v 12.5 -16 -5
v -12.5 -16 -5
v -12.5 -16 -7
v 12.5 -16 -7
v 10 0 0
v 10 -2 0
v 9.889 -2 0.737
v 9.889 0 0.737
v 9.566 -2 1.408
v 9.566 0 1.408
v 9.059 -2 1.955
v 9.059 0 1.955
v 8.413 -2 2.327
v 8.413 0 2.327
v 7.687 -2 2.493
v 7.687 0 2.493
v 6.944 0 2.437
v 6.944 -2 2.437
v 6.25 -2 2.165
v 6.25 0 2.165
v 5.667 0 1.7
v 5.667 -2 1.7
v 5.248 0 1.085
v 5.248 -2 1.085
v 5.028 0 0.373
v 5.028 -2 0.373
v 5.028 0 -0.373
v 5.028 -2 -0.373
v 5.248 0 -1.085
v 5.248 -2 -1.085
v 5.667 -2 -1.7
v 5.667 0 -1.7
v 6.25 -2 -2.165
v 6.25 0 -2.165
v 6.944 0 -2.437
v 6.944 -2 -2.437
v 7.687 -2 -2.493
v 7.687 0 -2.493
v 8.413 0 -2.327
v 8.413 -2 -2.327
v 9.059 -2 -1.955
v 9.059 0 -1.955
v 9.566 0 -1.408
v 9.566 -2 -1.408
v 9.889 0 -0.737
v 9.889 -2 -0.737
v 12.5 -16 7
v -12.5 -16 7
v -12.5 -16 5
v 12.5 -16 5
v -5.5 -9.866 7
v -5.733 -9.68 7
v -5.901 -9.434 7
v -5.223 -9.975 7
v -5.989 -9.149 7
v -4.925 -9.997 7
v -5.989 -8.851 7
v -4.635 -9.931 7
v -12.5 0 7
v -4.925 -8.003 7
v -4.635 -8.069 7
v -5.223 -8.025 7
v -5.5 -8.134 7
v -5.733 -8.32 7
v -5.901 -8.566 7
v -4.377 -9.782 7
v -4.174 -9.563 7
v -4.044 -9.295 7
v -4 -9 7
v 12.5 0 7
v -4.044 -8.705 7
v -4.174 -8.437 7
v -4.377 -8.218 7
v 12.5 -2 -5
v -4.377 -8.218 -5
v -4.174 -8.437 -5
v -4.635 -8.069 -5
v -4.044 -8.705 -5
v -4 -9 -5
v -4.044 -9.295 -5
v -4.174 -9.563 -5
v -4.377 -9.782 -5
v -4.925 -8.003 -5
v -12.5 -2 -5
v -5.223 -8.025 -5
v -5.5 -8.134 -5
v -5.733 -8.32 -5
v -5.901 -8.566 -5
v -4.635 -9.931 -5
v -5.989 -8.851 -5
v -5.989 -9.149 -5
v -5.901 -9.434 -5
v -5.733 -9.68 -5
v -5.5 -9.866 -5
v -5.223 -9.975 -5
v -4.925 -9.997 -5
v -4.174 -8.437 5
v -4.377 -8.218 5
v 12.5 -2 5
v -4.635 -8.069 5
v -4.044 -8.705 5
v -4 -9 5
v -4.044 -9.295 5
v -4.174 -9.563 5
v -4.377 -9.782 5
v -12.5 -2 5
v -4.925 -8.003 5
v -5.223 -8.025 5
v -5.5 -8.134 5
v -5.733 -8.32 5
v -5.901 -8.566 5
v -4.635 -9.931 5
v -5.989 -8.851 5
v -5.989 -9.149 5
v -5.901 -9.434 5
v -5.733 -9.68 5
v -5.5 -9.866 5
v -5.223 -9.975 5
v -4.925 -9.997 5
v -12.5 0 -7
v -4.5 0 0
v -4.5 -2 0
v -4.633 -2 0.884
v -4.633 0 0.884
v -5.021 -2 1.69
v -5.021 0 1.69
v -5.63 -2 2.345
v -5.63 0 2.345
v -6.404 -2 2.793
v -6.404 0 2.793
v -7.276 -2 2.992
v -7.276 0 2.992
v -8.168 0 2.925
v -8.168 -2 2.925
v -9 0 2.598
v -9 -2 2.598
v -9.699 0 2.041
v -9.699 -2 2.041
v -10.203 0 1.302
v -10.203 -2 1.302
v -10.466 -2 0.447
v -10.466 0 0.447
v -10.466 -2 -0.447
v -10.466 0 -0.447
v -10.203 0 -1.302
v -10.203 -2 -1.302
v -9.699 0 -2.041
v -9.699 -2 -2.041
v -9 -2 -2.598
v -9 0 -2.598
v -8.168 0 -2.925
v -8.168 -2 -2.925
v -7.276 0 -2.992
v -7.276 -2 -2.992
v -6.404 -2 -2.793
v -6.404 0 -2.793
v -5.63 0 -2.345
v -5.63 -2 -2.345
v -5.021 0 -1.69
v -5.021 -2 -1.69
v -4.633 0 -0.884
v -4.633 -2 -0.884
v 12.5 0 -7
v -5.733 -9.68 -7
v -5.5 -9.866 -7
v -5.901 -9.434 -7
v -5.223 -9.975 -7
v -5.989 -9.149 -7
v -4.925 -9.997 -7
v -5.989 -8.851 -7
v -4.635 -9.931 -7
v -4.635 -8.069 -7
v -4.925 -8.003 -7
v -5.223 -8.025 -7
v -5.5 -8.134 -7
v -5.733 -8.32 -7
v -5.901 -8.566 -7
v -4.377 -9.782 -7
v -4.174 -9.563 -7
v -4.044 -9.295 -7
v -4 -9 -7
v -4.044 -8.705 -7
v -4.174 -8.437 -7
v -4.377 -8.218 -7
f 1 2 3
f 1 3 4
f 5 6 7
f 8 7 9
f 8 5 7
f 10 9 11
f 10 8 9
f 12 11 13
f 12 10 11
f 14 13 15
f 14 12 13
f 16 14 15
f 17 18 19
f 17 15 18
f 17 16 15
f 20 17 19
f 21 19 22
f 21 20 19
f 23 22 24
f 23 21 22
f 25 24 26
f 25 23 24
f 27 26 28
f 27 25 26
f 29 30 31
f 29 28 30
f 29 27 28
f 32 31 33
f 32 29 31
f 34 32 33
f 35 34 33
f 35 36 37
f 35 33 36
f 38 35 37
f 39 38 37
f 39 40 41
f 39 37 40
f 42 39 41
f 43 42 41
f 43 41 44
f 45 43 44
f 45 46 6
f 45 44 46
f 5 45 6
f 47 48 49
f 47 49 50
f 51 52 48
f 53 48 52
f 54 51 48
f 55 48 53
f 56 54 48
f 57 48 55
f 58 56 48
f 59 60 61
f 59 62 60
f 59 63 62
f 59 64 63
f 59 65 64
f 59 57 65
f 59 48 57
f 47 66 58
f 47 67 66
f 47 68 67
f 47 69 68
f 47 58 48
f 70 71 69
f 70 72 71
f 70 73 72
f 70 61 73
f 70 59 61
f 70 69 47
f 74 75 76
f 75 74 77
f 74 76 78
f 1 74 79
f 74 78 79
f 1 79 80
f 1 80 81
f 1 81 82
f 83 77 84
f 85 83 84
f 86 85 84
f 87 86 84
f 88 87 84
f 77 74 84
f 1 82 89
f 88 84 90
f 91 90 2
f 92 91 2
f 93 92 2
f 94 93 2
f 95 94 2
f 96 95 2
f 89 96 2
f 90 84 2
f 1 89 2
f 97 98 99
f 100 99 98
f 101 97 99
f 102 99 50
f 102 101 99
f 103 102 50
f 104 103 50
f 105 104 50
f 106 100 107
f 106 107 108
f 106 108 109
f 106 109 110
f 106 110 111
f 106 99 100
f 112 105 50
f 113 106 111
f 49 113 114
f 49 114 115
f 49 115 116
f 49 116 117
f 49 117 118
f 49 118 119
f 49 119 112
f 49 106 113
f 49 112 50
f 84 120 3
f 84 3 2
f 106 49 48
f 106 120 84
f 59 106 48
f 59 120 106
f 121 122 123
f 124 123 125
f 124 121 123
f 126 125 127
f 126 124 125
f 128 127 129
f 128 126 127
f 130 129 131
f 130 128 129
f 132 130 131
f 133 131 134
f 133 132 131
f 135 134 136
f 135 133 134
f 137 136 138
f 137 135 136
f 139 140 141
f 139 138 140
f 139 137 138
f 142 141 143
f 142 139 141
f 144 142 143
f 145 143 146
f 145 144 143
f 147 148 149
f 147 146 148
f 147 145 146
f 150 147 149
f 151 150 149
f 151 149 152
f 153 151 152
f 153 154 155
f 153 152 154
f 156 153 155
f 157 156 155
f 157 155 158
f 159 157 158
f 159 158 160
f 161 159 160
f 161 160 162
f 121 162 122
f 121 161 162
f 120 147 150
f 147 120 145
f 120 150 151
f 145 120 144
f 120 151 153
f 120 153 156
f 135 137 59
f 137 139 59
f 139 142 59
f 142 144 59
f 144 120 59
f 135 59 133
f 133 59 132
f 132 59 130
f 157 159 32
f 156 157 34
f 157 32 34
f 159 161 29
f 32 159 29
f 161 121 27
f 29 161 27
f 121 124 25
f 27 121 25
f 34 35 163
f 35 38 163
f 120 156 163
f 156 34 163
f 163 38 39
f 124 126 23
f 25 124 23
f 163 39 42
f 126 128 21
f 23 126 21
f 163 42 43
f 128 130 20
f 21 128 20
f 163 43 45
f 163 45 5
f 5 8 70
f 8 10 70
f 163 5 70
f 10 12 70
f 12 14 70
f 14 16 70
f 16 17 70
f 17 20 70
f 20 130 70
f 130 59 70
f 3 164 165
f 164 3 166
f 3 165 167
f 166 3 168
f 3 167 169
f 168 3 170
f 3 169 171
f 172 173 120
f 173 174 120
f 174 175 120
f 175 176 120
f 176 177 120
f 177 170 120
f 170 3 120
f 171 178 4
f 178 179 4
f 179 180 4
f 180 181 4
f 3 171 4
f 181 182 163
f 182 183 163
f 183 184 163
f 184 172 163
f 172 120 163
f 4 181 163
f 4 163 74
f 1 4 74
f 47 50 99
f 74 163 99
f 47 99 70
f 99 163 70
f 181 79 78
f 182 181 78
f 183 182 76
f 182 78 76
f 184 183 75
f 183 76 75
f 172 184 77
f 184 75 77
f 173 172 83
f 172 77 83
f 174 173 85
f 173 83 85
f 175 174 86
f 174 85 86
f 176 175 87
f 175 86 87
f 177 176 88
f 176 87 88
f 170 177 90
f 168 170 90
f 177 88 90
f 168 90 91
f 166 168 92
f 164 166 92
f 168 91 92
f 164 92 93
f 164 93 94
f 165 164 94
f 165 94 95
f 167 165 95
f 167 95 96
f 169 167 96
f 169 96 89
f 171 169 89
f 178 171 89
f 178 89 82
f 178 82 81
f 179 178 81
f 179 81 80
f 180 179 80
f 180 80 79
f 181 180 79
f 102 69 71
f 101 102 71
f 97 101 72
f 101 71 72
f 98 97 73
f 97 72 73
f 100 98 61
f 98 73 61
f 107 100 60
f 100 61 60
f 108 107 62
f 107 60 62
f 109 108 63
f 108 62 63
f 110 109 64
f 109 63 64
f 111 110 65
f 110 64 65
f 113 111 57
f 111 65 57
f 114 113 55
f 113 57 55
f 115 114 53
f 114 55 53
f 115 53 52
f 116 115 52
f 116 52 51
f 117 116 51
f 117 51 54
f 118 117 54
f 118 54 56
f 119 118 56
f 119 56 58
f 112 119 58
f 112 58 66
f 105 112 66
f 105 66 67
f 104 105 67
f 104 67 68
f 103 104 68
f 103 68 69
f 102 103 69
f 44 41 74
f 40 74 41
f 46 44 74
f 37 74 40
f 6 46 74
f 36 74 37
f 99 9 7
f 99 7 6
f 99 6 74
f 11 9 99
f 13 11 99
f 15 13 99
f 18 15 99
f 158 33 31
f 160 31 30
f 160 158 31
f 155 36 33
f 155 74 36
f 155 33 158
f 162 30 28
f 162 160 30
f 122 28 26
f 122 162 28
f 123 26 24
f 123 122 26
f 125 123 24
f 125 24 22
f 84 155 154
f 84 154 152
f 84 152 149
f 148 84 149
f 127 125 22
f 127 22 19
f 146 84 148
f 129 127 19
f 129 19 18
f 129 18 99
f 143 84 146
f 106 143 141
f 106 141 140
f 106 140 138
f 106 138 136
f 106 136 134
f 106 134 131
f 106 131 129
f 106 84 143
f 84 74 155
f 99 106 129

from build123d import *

# Parameters (mm, degrees)
F0_W     = 25
F0_H     = 14
F0_R     = 3
F0_R_2   = 2.5
F1_DEPTH = 16
F2_R     = 1
F3_DEPTH = 25
F4_W     = 14
F4_H     = 10
F5_DEPTH = 25


with BuildPart() as f1:
    # F0 (on Front) → F1 (new body)
    with BuildSketch(Plane.XZ):
        Rectangle(F0_W, F0_H)
        with Locations((-7.5, 0)):
            Circle(F0_R, mode=Mode.SUBTRACT)
        with Locations((7.5, 0)):
            Circle(F0_R_2, mode=Mode.SUBTRACT)
    extrude(amount=F1_DEPTH)

    # F2 (on face) → F3 (cut)
    with BuildSketch(Plane.XY.offset(7)):
        with Locations((-5, -9)):
            Circle(F2_R)
    extrude(amount=-F3_DEPTH, mode=Mode.SUBTRACT)

    # F4 (on face) → F5 (cut)
    with BuildSketch(Plane(origin=(-12.5, 0, 0), x_dir=(0, -1, 0), z_dir=(-1, 0, 0))):
        with Locations((9, 0)):
            Rectangle(F4_W, F4_H)
    extrude(amount=-F5_DEPTH, mode=Mode.SUBTRACT)


solid = f1.part
